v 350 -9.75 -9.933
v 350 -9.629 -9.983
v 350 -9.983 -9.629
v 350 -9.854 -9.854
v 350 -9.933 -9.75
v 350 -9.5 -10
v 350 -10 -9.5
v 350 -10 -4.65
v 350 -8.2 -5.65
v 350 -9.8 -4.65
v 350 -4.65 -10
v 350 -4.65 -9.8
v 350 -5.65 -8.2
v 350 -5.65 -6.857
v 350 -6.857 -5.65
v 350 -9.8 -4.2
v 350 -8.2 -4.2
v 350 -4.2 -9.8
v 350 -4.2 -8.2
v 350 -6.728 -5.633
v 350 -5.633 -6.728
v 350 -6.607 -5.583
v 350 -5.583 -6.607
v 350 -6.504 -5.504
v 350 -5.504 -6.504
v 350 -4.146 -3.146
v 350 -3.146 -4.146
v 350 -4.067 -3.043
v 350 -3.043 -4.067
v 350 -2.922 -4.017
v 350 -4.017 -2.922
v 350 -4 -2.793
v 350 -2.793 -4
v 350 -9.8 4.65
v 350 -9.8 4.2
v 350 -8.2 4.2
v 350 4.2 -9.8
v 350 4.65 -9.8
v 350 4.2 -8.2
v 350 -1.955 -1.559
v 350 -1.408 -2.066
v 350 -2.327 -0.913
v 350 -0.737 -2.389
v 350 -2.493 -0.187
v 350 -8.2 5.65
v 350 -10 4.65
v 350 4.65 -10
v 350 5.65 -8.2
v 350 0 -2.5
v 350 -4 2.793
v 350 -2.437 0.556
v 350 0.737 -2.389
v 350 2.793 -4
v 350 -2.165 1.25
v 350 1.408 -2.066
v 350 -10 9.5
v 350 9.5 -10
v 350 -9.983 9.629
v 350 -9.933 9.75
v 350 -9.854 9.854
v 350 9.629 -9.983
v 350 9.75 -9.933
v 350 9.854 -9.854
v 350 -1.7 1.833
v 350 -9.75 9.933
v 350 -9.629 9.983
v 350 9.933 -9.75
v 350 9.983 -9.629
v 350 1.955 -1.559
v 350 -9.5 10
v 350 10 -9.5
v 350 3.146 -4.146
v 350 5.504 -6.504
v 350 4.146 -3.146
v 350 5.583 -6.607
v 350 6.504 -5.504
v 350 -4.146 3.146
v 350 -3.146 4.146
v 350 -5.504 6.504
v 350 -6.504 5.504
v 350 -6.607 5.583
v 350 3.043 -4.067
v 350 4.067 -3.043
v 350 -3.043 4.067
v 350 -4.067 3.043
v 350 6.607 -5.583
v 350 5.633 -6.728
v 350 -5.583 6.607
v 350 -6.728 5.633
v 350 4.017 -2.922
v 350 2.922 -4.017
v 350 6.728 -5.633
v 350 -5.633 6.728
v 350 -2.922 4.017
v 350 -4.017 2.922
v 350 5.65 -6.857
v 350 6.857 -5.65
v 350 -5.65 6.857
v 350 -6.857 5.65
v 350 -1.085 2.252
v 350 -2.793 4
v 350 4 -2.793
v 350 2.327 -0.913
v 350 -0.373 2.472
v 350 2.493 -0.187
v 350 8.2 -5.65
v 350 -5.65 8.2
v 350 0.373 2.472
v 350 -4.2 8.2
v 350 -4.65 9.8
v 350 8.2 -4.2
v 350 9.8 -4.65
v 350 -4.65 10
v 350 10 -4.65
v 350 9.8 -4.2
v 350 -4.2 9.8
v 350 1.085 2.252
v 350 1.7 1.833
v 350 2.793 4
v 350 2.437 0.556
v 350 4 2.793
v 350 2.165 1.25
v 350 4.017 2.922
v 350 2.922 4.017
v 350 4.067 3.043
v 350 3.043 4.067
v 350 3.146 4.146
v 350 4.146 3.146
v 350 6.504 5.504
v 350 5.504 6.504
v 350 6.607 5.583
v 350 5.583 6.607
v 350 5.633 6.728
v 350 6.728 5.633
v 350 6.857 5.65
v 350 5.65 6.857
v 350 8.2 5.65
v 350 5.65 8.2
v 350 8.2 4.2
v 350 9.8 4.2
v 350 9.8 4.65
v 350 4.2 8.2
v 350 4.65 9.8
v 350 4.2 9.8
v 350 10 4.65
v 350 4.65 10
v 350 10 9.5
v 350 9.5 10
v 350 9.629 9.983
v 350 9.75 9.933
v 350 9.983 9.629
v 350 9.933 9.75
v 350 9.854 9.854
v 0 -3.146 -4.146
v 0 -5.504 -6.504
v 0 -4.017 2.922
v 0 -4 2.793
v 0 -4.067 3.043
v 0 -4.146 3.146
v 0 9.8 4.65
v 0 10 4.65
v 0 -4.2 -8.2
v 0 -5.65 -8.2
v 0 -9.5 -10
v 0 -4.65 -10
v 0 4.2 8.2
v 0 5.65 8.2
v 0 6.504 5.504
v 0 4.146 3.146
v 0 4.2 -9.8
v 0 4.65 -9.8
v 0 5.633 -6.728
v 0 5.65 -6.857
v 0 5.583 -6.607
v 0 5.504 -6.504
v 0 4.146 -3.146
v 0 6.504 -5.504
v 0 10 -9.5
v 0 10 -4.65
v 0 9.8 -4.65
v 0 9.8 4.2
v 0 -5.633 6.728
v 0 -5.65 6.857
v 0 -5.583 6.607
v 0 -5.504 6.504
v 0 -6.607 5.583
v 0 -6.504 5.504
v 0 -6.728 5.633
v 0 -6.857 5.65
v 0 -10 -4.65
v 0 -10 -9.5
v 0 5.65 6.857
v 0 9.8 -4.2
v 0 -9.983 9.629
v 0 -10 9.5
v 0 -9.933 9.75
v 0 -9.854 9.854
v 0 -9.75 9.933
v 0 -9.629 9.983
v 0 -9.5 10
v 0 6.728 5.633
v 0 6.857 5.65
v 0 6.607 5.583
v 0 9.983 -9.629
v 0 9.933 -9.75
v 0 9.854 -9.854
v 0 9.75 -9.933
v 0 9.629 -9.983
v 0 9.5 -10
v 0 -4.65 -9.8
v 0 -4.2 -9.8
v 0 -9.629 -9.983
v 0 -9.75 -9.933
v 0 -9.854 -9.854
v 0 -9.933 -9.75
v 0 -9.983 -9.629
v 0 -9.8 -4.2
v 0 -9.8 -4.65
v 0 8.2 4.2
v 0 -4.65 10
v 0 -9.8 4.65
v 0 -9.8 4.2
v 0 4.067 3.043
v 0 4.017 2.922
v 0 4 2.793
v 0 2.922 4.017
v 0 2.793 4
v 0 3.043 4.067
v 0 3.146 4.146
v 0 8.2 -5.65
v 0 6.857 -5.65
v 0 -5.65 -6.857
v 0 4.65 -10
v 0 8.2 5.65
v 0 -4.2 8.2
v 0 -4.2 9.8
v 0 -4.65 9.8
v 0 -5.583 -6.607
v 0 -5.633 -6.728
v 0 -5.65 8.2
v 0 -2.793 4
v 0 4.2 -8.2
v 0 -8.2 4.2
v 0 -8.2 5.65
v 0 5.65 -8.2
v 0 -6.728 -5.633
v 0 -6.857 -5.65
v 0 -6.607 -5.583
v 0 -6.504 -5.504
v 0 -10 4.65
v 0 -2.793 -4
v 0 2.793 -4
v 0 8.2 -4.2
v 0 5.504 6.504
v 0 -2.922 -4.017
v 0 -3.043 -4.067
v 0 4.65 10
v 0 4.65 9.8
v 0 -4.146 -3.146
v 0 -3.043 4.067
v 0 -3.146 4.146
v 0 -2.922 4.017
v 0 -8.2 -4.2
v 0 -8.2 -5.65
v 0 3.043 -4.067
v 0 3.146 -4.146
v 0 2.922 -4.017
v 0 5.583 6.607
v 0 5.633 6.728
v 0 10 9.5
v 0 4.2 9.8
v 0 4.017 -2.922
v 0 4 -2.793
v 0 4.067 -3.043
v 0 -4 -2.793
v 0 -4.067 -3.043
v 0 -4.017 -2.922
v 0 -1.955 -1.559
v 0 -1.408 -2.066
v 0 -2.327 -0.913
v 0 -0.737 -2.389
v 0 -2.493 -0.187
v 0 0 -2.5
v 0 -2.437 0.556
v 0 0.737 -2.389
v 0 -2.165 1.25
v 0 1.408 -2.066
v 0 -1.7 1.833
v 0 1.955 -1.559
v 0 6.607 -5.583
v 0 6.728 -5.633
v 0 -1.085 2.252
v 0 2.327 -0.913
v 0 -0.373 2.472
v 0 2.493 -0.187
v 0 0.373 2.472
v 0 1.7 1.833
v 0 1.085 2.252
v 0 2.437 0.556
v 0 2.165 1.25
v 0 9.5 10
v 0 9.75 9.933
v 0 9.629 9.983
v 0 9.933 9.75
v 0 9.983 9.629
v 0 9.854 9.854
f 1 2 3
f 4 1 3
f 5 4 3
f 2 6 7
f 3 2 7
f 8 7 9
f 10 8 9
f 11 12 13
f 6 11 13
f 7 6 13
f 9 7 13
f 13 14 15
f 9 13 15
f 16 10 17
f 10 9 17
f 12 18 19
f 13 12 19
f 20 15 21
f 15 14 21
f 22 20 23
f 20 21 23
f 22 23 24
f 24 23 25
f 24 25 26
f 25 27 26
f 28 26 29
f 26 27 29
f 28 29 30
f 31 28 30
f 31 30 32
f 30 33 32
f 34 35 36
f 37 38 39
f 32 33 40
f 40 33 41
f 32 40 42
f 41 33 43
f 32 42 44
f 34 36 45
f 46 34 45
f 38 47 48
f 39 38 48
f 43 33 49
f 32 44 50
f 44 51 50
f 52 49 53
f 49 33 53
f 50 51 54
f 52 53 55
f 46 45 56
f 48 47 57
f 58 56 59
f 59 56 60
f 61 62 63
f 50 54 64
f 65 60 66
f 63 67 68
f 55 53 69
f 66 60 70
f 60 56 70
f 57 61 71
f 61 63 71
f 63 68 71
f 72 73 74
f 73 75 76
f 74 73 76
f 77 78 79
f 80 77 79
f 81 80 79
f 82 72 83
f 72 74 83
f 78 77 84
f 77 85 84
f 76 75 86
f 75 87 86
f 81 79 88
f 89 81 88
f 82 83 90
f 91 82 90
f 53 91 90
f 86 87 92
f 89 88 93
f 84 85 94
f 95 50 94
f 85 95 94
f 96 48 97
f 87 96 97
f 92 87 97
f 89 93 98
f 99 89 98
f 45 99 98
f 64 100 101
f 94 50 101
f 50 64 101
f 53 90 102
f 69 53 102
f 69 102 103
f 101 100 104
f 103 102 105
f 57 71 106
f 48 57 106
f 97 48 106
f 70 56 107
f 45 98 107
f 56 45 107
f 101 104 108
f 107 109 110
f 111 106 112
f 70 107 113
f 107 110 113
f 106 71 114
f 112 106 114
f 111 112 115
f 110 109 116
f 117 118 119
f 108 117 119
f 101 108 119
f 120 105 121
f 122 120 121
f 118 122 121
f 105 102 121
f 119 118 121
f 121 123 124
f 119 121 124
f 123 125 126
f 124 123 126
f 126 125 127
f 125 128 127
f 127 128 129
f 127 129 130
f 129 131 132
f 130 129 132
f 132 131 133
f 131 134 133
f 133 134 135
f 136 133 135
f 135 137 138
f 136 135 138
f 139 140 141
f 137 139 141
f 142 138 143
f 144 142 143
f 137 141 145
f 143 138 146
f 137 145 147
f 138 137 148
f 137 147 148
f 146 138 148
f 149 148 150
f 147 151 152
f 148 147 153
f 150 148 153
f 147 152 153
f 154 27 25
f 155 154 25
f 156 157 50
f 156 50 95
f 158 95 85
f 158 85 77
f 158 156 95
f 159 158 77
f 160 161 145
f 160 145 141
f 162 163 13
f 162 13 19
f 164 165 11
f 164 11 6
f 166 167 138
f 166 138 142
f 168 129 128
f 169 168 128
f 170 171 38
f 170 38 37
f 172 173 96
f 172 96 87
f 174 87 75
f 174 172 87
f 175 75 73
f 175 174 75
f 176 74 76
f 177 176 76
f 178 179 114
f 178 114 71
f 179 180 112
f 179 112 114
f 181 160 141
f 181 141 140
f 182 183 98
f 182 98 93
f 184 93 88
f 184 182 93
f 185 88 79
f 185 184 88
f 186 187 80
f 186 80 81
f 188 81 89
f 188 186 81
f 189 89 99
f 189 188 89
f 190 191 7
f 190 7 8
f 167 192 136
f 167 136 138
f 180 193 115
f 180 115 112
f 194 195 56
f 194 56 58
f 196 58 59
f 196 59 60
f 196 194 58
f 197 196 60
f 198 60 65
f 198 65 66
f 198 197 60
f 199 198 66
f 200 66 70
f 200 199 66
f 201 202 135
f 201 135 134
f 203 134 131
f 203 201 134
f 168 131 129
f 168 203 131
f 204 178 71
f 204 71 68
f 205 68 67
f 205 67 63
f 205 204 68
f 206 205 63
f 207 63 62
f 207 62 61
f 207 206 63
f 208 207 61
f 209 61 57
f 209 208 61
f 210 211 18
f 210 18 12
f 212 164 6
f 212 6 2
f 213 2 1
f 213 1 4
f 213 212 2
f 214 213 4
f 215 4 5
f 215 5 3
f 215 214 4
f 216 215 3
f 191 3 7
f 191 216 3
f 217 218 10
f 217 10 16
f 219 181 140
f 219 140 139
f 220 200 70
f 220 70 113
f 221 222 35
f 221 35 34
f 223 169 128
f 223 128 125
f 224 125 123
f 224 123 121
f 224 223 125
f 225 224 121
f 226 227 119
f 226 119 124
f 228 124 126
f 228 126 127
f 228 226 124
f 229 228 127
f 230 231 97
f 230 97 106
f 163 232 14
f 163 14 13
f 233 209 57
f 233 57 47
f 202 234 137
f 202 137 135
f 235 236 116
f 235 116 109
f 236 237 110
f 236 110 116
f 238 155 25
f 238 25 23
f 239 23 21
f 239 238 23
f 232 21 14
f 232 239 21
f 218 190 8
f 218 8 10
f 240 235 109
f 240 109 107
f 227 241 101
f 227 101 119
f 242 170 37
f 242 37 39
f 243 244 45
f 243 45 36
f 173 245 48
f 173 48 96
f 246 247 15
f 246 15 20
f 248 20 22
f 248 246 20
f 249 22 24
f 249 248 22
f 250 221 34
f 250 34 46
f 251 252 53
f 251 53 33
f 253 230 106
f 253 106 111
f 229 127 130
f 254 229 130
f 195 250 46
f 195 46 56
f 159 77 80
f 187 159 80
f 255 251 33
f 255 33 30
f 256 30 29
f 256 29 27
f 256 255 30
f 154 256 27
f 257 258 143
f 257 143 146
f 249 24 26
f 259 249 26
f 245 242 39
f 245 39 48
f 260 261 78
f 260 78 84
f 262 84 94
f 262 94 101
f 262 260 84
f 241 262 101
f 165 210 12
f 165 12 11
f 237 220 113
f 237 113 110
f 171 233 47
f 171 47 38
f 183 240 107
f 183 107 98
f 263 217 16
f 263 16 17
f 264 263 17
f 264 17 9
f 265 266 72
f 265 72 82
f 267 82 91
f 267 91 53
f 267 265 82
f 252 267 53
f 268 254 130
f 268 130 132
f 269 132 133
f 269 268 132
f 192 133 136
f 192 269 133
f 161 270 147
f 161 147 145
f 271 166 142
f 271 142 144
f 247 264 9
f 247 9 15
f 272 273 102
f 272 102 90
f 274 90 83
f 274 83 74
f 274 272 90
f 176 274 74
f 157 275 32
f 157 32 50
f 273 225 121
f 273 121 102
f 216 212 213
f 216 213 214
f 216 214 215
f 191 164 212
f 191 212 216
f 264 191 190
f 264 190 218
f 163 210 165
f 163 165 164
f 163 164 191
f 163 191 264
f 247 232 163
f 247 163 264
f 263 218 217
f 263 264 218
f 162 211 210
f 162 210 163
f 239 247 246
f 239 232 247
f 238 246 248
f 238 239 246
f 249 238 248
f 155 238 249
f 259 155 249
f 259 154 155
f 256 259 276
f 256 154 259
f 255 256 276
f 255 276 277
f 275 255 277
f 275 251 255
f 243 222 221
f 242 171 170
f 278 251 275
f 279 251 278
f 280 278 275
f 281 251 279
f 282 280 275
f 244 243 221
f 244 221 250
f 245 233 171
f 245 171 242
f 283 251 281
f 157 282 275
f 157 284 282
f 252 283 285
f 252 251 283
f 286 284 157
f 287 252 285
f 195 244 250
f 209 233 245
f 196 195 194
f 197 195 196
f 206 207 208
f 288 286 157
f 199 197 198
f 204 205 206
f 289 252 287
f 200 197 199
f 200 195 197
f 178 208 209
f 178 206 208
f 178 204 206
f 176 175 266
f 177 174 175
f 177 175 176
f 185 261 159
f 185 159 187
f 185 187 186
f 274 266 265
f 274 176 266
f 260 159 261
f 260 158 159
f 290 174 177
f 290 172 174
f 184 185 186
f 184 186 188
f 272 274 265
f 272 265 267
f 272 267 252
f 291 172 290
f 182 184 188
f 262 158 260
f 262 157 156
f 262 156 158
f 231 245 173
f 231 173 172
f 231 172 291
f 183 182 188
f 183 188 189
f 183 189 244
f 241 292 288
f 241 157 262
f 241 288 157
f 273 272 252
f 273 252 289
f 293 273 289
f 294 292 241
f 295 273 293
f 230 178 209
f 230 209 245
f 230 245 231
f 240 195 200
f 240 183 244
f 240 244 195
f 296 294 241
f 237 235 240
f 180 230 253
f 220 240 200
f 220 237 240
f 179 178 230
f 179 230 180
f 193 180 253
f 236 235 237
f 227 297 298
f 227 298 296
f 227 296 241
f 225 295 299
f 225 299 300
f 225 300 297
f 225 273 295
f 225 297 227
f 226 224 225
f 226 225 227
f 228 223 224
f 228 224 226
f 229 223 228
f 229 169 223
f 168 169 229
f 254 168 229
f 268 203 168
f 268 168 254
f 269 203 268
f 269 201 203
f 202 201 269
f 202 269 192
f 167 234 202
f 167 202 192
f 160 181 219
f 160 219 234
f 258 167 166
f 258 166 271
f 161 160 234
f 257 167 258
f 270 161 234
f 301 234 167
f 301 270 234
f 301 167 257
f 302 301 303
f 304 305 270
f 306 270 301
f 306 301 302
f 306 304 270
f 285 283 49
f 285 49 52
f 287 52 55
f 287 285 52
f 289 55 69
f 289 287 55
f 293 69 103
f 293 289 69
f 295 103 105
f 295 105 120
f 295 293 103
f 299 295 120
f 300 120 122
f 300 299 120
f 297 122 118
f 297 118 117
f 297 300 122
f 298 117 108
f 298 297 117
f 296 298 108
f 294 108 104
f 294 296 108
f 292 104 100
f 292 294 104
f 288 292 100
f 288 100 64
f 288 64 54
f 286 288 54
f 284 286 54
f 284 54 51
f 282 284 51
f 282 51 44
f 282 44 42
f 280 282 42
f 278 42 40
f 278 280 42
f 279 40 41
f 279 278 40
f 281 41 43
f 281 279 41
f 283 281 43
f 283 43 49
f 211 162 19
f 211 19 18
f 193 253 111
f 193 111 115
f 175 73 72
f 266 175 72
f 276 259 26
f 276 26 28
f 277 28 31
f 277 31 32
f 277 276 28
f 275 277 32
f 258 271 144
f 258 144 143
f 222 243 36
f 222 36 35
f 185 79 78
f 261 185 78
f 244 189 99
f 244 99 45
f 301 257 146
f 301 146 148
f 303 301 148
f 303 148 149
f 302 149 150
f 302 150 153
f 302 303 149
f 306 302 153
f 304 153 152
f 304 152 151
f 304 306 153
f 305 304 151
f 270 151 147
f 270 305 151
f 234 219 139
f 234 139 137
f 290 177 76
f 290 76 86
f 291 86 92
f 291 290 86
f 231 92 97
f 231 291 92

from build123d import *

# Parameters (mm, degrees)
IZIM1_R             = 2.5
BOSS_EXTRUDE1_DEPTH = 350


with BuildPart() as part:
    # Çizim1 → Boss-Extrude1 (new body)
    with BuildSketch(Plane(origin=(0, 0, 0), x_dir=(0, 0, -1), z_dir=(1, 0, 0))):
        with BuildLine():
            Line((-9.5, 10), (-4.65, 10))
            Line((-4.65, 10), (-4.65, 9.8))
            Line((-4.65, 9.8), (-4.2, 9.8))
            Line((-4.2, 9.8), (-4.2, 8.2))
            Line((-4.2, 8.2), (-5.65, 8.2))
            Line((-5.65, 8.2), (-5.65, 6.857106781))
            ThreePointArc((-5.65, 6.857106781), (-5.611939766, 6.665765065), (-5.503553391, 6.503553391))
            Line((-5.503553391, 6.503553391), (-3.146446609, 4.146446609))
            ThreePointArc((-3.146446609, 4.146446609), (-2.984234935, 4.038060234), (-2.792893219, 4))
            Line((-2.792893219, 4), (2.792893219, 4))
            ThreePointArc((2.792893219, 4), (2.984234935, 4.038060234), (3.146446609, 4.146446609))
            Line((3.146446609, 4.146446609), (5.503553391, 6.503553391))
            ThreePointArc((5.503553391, 6.503553391), (5.611939766, 6.665765065), (5.65, 6.857106781))
            Line((5.65, 6.857106781), (5.65, 8.2))
            Line((5.65, 8.2), (4.2, 8.2))
            Line((4.2, 8.2), (4.2, 9.8))
            Line((4.2, 9.8), (4.65, 9.8))
            Line((4.65, 9.8), (4.65, 10))
            Line((4.65, 10), (9.5, 10))
            ThreePointArc((9.5, 10), (9.853553391, 9.853553391), (10, 9.5))
            Line((10, 9.5), (10, 4.65))
            Line((10, 4.65), (9.8, 4.65))
            Line((9.8, 4.65), (9.8, 4.2))
            Line((9.8, 4.2), (8.2, 4.2))
            Line((8.2, 4.2), (8.2, 5.65))
            Line((8.2, 5.65), (6.857106781, 5.65))
            ThreePointArc((6.857106781, 5.65), (6.665765065, 5.611939766), (6.503553391, 5.503553391))
            Line((6.503553391, 5.503553391), (4.146446609, 3.146446609))
            ThreePointArc((4.146446609, 3.146446609), (4.038060234, 2.984234935), (4, 2.792893219))
            Line((4, 2.792893219), (4, -2.792893219))
            ThreePointArc((4, -2.792893219), (4.038060234, -2.984234935), (4.146446609, -3.146446609))
            Line((4.146446609, -3.146446609), (6.503553391, -5.503553391))
            ThreePointArc((6.503553391, -5.503553391), (6.665765065, -5.611939766), (6.857106781, -5.65))
            Line((6.857106781, -5.65), (8.2, -5.65))
            Line((8.2, -5.65), (8.2, -4.2))
            Line((8.2, -4.2), (9.8, -4.2))
            Line((9.8, -4.2), (9.8, -4.65))
            Line((9.8, -4.65), (10, -4.65))
            Line((10, -4.65), (10, -9.5))
            ThreePointArc((10, -9.5), (9.853553391, -9.853553391), (9.5, -10))
            Line((9.5, -10), (4.65, -10))
            Line((4.65, -10), (4.65, -9.8))
            Line((4.65, -9.8), (4.2, -9.8))
            Line((4.2, -9.8), (4.2, -8.2))
            Line((4.2, -8.2), (5.65, -8.2))
            Line((5.65, -8.2), (5.65, -6.857106781))
            ThreePointArc((5.65, -6.857106781), (5.611939766, -6.665765065), (5.503553391, -6.503553391))
            Line((5.503553391, -6.503553391), (3.146446609, -4.146446609))
            ThreePointArc((3.146446609, -4.146446609), (2.984234935, -4.038060234), (2.792893219, -4))
            Line((2.792893219, -4), (-2.792893219, -4))
            ThreePointArc((-2.792893219, -4), (-2.984234935, -4.038060234), (-3.146446609, -4.146446609))
            Line((-3.146446609, -4.146446609), (-5.503553391, -6.503553391))
            ThreePointArc((-5.503553391, -6.503553391), (-5.611939766, -6.665765065), (-5.65, -6.857106781))
            Line((-5.65, -6.857106781), (-5.65, -8.2))
            Line((-5.65, -8.2), (-4.2, -8.2))
            Line((-4.2, -8.2), (-4.2, -9.8))
            Line((-4.2, -9.8), (-4.65, -9.8))
            Line((-4.65, -9.8), (-4.65, -10))
            Line((-4.65, -10), (-9.5, -10))
            ThreePointArc((-9.5, -10), (-9.853553391, -9.853553391), (-10, -9.5))
            Line((-10, -9.5), (-10, -4.65))
            Line((-10, -4.65), (-9.8, -4.65))
            Line((-9.8, -4.65), (-9.8, -4.2))
            Line((-9.8, -4.2), (-8.2, -4.2))
            Line((-8.2, -4.2), (-8.2, -5.65))
            Line((-8.2, -5.65), (-6.857106781, -5.65))
            ThreePointArc((-6.857106781, -5.65), (-6.665765065, -5.611939766), (-6.503553391, -5.503553391))
            Line((-6.503553391, -5.503553391), (-4.146446609, -3.146446609))
            ThreePointArc((-4.146446609, -3.146446609), (-4.038060234, -2.984234935), (-4, -2.792893219))
            Line((-4, -2.792893219), (-4, 2.792893219))
            ThreePointArc((-4, 2.792893219), (-4.038060234, 2.984234935), (-4.146446609, 3.146446609))
            Line((-4.146446609, 3.146446609), (-6.503553391, 5.503553391))
            ThreePointArc((-6.503553391, 5.503553391), (-6.665765065, 5.611939766), (-6.857106781, 5.65))
            Line((-6.857106781, 5.65), (-8.2, 5.65))
            Line((-8.2, 5.65), (-8.2, 4.2))
            Line((-8.2, 4.2), (-9.8, 4.2))
            Line((-9.8, 4.2), (-9.8, 4.65))
            Line((-9.8, 4.65), (-10, 4.65))
            Line((-10, 4.65), (-10, 9.5))
            ThreePointArc((-10, 9.5), (-9.853553391, 9.853553391), (-9.5, 10))
        make_face()
        Circle(IZIM1_R, mode=Mode.SUBTRACT)
    extrude(amount=BOSS_EXTRUDE1_DEPTH)


solid = part.part
